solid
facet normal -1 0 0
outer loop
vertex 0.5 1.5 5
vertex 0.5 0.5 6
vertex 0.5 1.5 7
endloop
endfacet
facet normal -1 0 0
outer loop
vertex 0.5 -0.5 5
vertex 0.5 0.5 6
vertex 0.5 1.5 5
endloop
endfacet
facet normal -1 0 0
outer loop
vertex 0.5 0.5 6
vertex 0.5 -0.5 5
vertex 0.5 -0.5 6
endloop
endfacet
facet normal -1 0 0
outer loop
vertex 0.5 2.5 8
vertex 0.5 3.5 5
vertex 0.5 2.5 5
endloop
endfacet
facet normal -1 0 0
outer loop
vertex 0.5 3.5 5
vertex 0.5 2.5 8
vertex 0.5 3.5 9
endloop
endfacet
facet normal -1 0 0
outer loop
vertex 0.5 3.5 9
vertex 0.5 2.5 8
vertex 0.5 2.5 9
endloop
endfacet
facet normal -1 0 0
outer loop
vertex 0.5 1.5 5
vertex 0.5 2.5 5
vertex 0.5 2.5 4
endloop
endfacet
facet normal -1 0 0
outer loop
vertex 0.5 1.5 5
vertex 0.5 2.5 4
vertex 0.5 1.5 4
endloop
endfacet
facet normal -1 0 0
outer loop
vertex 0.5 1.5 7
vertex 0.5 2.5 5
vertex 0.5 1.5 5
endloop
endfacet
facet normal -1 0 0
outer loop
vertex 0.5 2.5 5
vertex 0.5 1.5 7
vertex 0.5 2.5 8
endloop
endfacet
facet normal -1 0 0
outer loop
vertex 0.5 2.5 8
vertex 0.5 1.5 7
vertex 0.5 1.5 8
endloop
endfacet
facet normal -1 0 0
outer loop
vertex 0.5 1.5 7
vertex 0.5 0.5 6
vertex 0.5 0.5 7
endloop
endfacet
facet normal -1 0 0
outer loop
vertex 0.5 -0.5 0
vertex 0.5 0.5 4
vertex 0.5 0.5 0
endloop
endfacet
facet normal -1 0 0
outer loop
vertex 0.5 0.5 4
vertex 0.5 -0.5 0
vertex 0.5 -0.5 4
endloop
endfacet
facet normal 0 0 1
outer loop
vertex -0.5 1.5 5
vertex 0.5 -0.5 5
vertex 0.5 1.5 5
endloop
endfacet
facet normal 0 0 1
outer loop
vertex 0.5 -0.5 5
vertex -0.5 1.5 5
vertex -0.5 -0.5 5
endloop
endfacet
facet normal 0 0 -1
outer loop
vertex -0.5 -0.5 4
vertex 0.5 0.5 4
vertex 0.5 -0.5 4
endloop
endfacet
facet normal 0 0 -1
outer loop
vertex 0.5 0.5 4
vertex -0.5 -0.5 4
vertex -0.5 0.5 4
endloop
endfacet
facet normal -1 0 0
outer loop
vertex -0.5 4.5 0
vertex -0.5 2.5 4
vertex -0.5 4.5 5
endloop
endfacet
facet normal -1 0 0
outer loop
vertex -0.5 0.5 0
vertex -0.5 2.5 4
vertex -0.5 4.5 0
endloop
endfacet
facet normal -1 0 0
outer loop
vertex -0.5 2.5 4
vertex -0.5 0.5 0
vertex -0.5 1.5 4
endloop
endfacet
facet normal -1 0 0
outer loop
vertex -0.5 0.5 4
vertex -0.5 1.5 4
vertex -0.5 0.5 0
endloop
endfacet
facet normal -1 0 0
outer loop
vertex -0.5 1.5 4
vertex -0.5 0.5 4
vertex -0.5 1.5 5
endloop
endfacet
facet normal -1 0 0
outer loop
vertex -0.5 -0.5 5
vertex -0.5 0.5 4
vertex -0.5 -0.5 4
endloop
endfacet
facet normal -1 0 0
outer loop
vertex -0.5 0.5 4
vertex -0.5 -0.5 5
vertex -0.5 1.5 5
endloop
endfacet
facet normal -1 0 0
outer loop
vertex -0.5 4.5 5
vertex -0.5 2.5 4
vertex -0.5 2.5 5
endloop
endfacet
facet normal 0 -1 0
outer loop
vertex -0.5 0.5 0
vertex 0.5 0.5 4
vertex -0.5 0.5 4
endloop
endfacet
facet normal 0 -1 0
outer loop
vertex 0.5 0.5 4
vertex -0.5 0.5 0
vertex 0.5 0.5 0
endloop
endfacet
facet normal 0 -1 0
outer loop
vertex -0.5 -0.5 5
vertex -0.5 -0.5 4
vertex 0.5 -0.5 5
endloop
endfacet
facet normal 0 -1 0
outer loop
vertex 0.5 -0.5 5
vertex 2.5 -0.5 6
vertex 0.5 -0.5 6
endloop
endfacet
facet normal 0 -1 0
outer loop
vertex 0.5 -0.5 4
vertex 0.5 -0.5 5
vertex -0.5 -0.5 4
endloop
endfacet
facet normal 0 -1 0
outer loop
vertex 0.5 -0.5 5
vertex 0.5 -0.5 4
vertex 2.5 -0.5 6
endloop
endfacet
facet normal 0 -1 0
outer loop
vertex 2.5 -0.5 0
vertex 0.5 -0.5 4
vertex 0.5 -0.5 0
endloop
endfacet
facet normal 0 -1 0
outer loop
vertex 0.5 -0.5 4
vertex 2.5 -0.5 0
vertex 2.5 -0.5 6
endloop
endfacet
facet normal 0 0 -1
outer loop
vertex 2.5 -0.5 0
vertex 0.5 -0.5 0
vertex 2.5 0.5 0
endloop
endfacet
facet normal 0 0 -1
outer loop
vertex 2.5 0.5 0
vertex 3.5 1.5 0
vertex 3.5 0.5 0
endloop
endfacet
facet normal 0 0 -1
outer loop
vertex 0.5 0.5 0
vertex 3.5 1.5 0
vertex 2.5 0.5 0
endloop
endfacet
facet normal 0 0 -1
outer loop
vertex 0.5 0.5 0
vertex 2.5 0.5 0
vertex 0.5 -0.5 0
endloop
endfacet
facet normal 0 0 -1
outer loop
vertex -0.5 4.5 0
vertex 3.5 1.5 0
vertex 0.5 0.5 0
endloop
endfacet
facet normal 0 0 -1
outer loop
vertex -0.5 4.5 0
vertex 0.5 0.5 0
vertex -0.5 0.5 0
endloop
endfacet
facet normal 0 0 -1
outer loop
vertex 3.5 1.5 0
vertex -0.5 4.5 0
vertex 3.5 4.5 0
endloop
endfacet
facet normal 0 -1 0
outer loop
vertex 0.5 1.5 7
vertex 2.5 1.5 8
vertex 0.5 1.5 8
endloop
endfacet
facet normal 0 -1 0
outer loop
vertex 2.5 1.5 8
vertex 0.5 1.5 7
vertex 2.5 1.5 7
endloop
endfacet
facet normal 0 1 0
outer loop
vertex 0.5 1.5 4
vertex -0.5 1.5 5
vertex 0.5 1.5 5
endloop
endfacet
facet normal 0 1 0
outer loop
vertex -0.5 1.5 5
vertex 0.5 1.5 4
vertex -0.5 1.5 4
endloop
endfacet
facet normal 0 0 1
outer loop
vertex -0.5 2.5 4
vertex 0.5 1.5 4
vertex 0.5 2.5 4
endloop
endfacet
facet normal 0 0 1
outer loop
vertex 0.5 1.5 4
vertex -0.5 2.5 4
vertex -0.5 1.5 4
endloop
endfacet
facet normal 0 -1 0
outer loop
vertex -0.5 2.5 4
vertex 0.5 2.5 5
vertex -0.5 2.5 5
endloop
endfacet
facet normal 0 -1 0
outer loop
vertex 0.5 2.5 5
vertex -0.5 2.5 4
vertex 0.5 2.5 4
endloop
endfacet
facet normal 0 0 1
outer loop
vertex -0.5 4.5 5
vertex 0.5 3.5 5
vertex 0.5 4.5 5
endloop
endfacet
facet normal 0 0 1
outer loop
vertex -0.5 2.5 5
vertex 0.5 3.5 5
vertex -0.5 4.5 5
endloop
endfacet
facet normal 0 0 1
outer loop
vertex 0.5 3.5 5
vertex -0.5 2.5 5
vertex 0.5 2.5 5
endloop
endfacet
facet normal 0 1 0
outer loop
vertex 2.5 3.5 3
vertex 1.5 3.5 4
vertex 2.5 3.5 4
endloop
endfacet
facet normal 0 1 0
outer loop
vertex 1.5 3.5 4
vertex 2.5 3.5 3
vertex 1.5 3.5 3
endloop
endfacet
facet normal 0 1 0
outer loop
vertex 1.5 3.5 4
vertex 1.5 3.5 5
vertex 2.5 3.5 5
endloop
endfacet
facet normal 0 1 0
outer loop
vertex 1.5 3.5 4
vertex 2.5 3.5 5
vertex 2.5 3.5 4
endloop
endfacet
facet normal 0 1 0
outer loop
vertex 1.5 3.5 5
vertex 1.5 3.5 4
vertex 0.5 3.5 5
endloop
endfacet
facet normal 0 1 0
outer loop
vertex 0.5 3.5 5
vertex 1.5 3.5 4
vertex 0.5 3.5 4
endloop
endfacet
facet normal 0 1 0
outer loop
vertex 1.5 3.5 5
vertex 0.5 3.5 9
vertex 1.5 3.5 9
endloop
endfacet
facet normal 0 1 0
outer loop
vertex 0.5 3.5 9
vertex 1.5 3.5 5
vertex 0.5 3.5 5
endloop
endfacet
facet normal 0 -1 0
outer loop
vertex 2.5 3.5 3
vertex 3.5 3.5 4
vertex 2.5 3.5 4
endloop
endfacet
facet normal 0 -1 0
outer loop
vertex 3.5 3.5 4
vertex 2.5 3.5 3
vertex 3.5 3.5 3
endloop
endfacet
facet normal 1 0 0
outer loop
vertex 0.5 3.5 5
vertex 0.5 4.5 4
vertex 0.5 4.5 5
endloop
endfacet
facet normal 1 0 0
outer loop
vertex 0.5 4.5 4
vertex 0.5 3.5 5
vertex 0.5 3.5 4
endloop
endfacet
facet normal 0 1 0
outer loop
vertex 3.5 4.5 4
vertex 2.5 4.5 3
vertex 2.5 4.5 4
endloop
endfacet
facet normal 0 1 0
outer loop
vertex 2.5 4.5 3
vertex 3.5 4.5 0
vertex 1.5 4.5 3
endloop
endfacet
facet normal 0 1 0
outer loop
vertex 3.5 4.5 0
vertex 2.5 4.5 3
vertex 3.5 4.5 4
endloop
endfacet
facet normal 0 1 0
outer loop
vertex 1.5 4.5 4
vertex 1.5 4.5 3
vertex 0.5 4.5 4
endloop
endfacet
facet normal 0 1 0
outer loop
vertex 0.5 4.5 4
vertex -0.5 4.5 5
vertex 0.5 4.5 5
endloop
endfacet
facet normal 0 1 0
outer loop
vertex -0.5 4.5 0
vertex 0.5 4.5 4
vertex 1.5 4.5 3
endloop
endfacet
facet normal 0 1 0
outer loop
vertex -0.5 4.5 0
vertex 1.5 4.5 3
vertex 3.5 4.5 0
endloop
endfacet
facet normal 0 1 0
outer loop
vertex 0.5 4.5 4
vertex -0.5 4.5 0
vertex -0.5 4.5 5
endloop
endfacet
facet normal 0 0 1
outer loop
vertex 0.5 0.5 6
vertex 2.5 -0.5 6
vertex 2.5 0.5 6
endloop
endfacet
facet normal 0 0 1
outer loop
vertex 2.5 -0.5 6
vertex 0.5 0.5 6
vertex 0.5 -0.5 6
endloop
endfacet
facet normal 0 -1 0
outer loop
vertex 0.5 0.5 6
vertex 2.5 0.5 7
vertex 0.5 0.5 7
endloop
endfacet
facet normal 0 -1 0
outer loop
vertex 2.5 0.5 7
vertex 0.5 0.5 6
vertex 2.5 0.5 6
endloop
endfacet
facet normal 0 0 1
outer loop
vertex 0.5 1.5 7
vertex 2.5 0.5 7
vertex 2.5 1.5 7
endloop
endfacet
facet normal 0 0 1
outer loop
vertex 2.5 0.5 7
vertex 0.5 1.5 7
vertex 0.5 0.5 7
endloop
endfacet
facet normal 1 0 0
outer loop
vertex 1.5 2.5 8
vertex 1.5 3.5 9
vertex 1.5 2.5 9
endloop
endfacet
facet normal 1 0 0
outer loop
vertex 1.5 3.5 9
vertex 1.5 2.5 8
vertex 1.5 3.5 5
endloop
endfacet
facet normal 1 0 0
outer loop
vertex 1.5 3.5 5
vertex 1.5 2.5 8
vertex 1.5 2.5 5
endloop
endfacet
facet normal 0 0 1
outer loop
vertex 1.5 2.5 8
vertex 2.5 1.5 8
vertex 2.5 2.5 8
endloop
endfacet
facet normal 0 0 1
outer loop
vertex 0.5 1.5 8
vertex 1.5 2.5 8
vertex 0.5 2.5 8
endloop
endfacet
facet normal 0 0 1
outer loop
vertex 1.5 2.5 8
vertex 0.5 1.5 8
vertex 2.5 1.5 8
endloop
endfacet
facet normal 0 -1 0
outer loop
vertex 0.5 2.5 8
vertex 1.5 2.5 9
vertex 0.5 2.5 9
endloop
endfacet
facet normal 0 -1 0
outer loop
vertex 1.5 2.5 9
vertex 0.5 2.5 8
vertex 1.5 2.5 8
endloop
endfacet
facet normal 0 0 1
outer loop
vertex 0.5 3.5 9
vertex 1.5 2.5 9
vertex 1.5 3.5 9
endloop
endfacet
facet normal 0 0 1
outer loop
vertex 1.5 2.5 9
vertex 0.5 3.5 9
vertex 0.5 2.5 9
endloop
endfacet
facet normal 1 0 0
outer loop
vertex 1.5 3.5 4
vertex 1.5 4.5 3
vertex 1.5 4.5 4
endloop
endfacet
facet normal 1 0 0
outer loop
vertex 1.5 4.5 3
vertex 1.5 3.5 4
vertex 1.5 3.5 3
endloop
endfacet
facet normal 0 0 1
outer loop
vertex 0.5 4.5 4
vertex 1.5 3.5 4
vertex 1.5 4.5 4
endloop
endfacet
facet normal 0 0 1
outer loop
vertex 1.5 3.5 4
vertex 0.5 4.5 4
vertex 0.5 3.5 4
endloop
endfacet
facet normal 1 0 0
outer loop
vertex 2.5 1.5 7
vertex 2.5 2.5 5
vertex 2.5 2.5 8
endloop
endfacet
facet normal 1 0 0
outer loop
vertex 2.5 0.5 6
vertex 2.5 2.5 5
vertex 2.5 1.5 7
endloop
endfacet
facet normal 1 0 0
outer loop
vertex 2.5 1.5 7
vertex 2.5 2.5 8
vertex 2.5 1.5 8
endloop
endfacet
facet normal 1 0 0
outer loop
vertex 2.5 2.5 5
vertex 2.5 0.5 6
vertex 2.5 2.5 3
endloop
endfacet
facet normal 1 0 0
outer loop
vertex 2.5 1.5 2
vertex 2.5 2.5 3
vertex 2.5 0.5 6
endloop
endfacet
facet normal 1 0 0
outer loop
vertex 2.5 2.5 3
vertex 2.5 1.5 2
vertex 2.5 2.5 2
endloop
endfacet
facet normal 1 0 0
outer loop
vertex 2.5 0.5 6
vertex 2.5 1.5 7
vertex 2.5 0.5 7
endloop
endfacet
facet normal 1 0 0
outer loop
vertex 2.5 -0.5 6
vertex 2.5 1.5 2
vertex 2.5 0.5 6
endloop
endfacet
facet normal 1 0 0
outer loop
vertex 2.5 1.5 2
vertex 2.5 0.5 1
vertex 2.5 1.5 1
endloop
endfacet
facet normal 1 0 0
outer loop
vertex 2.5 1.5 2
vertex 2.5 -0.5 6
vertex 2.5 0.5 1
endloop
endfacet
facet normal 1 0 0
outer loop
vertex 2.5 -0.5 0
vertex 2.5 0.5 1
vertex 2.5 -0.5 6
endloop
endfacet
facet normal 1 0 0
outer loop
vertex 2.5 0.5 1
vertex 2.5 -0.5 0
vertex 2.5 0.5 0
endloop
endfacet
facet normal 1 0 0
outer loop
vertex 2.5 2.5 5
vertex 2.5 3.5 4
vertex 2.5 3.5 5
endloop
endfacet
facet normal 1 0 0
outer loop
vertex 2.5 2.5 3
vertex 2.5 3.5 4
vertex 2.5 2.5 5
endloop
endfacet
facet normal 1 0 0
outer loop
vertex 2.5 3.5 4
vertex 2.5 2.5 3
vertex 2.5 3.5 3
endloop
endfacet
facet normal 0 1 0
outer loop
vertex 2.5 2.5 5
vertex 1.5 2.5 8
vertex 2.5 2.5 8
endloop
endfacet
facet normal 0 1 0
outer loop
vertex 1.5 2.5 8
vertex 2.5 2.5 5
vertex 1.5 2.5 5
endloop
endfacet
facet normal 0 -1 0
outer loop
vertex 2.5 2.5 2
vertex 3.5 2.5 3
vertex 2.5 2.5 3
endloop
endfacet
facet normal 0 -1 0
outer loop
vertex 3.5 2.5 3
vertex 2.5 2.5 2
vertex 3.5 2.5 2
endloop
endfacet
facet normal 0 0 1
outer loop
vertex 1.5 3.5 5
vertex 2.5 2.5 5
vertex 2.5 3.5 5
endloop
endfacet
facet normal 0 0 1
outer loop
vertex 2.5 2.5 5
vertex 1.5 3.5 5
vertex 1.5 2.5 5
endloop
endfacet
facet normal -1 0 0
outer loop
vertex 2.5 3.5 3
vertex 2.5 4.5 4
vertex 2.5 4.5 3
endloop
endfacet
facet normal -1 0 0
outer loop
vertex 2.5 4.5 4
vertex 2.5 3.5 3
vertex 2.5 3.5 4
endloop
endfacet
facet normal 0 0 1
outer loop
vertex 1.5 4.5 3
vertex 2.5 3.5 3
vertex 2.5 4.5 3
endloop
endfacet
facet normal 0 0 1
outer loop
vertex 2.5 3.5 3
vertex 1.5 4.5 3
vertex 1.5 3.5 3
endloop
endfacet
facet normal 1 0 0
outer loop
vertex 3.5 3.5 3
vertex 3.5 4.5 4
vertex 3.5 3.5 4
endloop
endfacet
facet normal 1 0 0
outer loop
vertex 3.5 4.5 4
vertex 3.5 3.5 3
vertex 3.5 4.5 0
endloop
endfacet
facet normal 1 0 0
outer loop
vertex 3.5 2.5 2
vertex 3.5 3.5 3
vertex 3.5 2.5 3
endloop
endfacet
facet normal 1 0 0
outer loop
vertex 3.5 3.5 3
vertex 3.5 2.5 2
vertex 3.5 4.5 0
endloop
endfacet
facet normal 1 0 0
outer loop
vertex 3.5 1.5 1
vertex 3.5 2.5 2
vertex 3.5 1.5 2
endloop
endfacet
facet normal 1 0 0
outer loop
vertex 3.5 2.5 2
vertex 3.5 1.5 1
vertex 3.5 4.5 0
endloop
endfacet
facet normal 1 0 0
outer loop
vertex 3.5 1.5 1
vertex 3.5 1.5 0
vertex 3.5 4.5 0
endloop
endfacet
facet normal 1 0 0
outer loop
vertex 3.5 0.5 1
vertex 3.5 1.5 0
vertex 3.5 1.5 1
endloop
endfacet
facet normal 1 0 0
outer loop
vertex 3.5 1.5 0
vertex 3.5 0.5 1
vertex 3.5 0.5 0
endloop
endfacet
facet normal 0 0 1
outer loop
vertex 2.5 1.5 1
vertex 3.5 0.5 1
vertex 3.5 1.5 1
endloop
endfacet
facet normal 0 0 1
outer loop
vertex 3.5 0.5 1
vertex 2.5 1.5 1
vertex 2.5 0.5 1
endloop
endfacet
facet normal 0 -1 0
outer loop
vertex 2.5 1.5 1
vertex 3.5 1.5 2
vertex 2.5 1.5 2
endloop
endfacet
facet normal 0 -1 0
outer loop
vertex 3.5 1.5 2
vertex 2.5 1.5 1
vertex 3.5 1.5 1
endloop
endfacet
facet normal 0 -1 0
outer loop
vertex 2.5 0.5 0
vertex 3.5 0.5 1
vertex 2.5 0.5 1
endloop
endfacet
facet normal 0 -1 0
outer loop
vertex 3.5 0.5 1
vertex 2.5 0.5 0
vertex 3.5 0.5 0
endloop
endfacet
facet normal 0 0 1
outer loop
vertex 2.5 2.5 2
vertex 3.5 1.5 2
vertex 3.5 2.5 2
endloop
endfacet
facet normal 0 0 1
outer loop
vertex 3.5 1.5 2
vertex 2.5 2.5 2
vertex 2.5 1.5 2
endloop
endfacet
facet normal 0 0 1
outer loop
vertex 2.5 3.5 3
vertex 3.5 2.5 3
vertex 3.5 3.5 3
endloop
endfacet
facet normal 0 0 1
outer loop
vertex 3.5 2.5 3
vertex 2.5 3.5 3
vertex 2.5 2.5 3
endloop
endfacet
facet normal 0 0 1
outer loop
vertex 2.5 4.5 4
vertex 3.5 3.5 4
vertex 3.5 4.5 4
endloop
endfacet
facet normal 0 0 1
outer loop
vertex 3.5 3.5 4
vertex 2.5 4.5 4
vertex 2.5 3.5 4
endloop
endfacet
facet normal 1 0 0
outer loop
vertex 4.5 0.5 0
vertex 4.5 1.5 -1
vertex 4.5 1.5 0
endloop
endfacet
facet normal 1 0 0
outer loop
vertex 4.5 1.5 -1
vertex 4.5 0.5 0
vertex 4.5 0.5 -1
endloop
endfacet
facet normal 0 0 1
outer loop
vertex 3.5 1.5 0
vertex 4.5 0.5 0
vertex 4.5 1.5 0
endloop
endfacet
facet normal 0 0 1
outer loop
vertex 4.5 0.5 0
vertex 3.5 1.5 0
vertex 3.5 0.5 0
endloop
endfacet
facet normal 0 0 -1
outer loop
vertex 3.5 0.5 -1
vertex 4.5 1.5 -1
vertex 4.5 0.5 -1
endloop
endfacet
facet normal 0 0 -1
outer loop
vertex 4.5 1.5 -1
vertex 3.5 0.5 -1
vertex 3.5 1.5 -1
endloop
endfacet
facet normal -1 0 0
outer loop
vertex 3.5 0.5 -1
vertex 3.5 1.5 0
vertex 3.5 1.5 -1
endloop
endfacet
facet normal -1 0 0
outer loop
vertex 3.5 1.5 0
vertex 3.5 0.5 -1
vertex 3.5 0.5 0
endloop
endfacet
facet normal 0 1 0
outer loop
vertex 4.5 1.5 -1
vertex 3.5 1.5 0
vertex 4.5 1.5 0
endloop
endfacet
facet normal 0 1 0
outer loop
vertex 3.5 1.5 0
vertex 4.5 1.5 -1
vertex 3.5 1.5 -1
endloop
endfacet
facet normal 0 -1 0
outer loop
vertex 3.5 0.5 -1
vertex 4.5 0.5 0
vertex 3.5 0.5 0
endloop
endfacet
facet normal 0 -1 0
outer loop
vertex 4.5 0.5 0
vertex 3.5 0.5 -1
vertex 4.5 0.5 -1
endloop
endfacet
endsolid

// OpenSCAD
union() {
    translate([0, 0, 4.5]) color([1, 0, 0]) cube([1, 1, 1], center=true);
    translate([0, 1, 2.5]) cube([1, 1, 5], center=true);
    translate([0, 2, 2.0]) cube([1, 1, 4], center=true);
    translate([0, 3, 2.5]) cube([1, 1, 5], center=true);
    translate([0, 4, 2.5]) cube([1, 1, 5], center=true);
    translate([1, 0, 3.0]) cube([1, 1, 6], center=true);
    translate([1, 1, 3.5]) cube([1, 1, 7], center=true);
    translate([1, 2, 4.0]) cube([1, 1, 8], center=true);
    translate([1, 3, 4.5]) cube([1, 1, 9], center=true);
    translate([1, 4, 2.0]) cube([1, 1, 4], center=true);
    translate([2, 0, 3.0]) cube([1, 1, 6], center=true);
    translate([2, 1, 3.5]) cube([1, 1, 7], center=true);
    translate([2, 2, 4.0]) cube([1, 1, 8], center=true);
    translate([2, 3, 2.5]) cube([1, 1, 5], center=true);
    translate([2, 4, 1.5]) cube([1, 1, 3], center=true);
    translate([3, 1, 0.5]) cube([1, 1, 1], center=true);
    translate([3, 2, 1.0]) cube([1, 1, 2], center=true);
    translate([3, 3, 1.5]) cube([1, 1, 3], center=true);
    translate([3, 4, 2.0]) cube([1, 1, 4], center=true);
    translate([4, 1, -0.5]) color([0, 0, 1]) cube([1, 1, 1], center=true);
}
